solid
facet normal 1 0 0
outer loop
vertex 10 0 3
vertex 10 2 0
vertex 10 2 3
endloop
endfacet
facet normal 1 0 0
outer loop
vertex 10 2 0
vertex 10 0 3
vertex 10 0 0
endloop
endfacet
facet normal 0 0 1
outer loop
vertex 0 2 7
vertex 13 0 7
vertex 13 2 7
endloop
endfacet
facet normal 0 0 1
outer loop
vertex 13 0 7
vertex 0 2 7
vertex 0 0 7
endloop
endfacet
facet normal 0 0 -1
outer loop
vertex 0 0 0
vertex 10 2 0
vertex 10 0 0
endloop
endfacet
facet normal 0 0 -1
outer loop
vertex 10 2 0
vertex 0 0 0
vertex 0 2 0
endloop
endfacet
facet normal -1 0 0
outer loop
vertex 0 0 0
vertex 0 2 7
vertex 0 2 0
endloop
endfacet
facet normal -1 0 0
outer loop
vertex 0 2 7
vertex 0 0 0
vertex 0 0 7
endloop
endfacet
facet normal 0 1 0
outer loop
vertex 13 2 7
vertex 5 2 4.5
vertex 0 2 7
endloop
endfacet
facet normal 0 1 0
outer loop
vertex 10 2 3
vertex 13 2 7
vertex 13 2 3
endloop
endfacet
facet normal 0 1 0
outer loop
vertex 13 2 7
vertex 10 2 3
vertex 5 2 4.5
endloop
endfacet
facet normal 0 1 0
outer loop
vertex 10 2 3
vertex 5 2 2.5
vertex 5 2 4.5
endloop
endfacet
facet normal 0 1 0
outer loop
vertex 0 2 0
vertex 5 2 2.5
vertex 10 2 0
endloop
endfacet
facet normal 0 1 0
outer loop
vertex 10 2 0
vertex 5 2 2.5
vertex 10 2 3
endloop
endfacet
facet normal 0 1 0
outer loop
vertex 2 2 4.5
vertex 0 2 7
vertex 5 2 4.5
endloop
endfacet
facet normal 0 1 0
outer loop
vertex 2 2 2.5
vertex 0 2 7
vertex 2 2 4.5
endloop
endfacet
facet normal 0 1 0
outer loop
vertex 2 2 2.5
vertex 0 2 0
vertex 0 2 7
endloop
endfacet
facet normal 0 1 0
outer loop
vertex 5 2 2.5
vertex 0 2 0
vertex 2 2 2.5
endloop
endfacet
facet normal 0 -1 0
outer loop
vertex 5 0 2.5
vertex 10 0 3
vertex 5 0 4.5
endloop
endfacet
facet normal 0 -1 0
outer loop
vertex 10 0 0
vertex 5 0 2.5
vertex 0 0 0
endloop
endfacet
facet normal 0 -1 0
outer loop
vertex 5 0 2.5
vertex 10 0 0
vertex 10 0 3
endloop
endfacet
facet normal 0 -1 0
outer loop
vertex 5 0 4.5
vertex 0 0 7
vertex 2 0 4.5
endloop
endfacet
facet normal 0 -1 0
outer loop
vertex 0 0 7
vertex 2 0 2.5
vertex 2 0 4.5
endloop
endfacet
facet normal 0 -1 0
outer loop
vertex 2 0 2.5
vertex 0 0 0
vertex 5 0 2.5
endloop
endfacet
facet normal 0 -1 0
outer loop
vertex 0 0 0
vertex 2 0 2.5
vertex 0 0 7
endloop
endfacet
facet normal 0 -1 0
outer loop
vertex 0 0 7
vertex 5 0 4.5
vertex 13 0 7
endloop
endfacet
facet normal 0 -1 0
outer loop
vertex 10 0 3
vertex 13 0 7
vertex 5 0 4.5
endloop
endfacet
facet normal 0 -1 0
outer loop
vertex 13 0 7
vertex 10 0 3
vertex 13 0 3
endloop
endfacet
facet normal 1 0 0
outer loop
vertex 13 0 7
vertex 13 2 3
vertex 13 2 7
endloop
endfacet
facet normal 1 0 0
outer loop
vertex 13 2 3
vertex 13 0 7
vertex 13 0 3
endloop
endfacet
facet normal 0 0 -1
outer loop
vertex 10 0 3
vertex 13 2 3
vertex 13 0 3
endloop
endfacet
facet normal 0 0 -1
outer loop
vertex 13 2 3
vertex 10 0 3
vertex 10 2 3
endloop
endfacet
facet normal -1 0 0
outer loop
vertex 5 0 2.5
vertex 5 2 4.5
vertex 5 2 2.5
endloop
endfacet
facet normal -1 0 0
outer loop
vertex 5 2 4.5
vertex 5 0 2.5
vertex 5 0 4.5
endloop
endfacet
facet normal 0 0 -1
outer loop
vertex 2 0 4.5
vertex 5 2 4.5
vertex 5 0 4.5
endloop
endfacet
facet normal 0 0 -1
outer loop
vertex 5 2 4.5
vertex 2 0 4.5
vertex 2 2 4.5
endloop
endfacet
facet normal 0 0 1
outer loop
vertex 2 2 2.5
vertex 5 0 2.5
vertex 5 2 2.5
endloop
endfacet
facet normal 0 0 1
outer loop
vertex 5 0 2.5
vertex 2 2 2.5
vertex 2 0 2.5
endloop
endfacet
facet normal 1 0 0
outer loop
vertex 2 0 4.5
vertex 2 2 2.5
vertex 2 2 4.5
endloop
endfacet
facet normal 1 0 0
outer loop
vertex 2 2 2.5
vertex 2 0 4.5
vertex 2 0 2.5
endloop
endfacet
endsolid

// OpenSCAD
module lever(action_offset){
    translate([0,0,-action_offset]) {
        difference(){
            union(){
                cube([10,2,action_offset+7]);
                translate([10,0,action_offset+3]){
                    cube([3,2,4]);
                }
            }
            translate([2,-0.5,2.5]){
                cube([3,3,2]);
            }
        }
    }
}
lever(action_offset=0);
